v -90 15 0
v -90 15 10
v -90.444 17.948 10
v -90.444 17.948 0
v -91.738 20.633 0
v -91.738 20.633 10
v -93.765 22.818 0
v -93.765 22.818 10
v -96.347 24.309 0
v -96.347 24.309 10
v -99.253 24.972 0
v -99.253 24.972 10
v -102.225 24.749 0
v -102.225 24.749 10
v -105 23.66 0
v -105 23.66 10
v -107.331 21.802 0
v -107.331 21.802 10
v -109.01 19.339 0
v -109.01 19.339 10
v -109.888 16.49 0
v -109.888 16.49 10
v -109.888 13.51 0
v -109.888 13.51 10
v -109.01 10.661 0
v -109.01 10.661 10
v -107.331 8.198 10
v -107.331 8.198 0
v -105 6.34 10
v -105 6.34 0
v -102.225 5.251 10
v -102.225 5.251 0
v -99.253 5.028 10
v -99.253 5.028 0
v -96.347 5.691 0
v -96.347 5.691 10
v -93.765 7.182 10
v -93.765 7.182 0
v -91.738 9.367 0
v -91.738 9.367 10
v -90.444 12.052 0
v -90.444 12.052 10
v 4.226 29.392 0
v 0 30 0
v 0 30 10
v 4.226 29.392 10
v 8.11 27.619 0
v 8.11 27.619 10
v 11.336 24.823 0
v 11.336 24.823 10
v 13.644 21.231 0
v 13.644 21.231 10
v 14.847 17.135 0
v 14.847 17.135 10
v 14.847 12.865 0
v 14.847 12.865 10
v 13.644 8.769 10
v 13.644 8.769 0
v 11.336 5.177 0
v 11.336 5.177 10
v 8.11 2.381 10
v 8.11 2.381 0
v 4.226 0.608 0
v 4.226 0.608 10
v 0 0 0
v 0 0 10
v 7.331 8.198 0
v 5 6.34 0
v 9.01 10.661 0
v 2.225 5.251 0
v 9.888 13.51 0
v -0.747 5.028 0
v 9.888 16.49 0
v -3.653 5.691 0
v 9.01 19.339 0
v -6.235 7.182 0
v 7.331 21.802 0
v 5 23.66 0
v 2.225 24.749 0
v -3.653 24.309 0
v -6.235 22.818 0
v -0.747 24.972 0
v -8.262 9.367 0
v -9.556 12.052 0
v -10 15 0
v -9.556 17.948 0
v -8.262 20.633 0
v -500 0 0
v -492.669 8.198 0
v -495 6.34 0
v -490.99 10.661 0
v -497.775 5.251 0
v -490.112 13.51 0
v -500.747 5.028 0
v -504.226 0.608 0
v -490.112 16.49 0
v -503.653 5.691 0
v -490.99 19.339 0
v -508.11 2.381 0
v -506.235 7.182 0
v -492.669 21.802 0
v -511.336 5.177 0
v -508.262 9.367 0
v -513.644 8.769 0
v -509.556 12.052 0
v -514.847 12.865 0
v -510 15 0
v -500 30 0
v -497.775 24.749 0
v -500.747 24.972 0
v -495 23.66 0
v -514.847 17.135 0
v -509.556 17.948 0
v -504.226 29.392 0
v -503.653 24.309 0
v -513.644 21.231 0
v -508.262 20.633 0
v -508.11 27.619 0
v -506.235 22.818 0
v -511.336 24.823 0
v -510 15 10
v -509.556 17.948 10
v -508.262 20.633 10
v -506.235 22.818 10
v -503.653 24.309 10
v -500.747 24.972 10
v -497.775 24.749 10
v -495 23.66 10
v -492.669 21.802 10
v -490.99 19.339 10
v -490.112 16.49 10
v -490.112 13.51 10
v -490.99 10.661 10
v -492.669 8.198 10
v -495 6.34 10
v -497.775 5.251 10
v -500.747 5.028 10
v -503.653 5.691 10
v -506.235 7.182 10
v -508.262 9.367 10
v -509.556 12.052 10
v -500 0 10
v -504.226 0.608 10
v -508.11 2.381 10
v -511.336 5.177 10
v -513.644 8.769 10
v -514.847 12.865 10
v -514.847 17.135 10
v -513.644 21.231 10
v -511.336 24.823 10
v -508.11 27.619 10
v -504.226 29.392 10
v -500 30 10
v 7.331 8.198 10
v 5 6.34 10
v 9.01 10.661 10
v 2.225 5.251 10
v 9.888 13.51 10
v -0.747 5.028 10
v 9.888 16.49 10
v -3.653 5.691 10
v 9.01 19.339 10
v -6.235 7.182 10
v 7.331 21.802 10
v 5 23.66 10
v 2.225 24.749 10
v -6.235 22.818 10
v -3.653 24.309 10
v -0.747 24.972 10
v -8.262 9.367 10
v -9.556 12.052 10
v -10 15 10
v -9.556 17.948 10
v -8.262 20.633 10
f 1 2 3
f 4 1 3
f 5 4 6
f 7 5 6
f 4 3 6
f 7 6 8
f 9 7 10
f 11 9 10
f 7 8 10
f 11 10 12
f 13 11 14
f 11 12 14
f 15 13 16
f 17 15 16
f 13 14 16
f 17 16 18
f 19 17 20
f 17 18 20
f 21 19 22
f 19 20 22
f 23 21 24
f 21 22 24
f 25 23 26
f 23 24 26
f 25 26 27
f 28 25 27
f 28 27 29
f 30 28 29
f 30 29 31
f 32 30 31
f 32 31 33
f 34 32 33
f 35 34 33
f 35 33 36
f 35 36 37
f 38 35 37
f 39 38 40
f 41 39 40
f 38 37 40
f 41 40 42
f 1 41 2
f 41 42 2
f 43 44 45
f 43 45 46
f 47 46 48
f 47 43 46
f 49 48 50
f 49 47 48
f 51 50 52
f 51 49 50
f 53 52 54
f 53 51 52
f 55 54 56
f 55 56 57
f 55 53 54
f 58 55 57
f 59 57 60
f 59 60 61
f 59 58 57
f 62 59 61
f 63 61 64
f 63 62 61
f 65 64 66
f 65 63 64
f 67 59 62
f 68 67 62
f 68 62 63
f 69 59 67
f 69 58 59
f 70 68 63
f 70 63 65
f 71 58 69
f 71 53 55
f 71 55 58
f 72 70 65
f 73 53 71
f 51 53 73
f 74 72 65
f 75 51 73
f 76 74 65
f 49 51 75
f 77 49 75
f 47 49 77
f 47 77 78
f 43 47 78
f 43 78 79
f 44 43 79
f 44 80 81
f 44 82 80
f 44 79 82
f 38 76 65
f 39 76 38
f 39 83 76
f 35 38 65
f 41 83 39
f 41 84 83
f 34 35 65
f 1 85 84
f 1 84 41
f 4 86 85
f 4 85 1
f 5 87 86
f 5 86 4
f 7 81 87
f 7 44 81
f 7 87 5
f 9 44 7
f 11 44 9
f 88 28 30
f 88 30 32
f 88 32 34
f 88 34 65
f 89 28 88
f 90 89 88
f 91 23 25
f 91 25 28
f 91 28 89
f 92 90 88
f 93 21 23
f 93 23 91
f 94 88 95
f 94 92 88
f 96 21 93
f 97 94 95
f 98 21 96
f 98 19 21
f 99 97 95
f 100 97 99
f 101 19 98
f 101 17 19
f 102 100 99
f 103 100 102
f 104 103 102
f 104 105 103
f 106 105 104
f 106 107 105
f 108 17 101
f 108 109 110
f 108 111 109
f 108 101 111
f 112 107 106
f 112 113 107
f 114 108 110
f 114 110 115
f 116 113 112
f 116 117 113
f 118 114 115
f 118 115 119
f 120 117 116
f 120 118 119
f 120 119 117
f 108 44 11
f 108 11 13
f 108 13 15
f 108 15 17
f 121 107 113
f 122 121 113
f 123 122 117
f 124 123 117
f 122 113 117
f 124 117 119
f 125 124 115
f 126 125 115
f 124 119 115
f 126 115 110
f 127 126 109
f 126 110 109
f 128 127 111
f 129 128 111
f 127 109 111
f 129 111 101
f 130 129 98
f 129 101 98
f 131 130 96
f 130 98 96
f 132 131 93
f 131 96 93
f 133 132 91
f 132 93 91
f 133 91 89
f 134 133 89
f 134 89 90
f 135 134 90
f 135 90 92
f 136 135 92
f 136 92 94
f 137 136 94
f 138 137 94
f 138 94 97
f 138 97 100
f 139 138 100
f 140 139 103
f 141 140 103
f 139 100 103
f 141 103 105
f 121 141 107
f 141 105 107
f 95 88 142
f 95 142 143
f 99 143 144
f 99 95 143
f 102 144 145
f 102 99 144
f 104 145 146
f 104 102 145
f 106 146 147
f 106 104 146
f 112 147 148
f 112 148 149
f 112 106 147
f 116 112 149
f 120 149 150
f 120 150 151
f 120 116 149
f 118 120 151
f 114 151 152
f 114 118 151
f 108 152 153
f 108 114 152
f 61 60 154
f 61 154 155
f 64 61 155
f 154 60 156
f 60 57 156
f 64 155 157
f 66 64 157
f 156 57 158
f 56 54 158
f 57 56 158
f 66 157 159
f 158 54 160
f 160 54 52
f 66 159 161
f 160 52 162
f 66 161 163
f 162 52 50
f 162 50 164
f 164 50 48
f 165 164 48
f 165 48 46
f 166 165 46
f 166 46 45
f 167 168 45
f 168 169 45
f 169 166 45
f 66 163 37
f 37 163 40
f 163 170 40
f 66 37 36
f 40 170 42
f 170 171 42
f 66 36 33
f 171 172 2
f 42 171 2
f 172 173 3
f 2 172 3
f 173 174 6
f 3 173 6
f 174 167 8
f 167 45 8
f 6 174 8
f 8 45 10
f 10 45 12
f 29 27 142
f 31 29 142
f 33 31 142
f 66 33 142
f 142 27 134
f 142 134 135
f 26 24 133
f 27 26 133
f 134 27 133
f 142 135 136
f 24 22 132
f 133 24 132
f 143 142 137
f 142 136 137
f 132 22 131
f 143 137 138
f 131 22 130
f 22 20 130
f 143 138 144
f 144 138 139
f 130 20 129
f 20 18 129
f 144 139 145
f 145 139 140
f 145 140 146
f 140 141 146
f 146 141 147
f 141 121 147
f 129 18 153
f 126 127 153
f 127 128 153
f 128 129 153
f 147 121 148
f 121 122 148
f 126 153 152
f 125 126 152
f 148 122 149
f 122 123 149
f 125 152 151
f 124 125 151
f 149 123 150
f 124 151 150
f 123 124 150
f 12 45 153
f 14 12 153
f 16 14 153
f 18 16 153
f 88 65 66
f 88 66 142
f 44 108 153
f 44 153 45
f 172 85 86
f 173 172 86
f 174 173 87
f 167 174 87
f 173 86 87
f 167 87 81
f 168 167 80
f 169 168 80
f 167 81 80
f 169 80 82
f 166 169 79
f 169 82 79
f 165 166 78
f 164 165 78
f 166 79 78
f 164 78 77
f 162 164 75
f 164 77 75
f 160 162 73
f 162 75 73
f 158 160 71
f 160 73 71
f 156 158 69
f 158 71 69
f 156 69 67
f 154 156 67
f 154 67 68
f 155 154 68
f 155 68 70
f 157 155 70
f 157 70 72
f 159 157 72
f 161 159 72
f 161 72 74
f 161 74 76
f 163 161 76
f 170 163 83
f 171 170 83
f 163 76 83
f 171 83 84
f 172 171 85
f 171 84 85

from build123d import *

# Parameters (mm, degrees)
EXTRUDE_2_DEPTH     = 10
SKETCH_2_R          = 10
CUT_EXTRUDE_1_DEPTH = 10
SKETCH_3_R          = 10
CUT_EXTRUDE_2_DEPTH = 10


with BuildPart() as part:
    # Эскиз1 → Бобышка-Вытянуть2 (new body)
    with BuildSketch(Plane.XY):
        with BuildLine():
            Line((0, 0), (-500, 0))
            ThreePointArc((-500, 0), (-515, 15), (-500, 30))
            Line((-500, 30), (0, 30))
            ThreePointArc((0, 30), (15, 15), (0, 0))
        make_face()
    extrude(amount=EXTRUDE_2_DEPTH)

    # Эскиз2 → Вырез-Вытянуть1 (cut)
    with BuildSketch(Plane(origin=(0, 0, 0), x_dir=(-1, 0, 0), z_dir=(0, 0, -1))):
        with Locations((0, 15)):
            Circle(SKETCH_2_R)
        with Locations((500, 15)):
            Circle(SKETCH_2_R)
    extrude(amount=-CUT_EXTRUDE_1_DEPTH, mode=Mode.SUBTRACT)

    # Эскиз3 → Вырез-Вытянуть2 (cut)
    with BuildSketch(Plane.XY.offset(10)):
        with Locations((-100, 15)):
            Circle(SKETCH_3_R)
    extrude(amount=-CUT_EXTRUDE_2_DEPTH, mode=Mode.SUBTRACT)


solid = part.part
